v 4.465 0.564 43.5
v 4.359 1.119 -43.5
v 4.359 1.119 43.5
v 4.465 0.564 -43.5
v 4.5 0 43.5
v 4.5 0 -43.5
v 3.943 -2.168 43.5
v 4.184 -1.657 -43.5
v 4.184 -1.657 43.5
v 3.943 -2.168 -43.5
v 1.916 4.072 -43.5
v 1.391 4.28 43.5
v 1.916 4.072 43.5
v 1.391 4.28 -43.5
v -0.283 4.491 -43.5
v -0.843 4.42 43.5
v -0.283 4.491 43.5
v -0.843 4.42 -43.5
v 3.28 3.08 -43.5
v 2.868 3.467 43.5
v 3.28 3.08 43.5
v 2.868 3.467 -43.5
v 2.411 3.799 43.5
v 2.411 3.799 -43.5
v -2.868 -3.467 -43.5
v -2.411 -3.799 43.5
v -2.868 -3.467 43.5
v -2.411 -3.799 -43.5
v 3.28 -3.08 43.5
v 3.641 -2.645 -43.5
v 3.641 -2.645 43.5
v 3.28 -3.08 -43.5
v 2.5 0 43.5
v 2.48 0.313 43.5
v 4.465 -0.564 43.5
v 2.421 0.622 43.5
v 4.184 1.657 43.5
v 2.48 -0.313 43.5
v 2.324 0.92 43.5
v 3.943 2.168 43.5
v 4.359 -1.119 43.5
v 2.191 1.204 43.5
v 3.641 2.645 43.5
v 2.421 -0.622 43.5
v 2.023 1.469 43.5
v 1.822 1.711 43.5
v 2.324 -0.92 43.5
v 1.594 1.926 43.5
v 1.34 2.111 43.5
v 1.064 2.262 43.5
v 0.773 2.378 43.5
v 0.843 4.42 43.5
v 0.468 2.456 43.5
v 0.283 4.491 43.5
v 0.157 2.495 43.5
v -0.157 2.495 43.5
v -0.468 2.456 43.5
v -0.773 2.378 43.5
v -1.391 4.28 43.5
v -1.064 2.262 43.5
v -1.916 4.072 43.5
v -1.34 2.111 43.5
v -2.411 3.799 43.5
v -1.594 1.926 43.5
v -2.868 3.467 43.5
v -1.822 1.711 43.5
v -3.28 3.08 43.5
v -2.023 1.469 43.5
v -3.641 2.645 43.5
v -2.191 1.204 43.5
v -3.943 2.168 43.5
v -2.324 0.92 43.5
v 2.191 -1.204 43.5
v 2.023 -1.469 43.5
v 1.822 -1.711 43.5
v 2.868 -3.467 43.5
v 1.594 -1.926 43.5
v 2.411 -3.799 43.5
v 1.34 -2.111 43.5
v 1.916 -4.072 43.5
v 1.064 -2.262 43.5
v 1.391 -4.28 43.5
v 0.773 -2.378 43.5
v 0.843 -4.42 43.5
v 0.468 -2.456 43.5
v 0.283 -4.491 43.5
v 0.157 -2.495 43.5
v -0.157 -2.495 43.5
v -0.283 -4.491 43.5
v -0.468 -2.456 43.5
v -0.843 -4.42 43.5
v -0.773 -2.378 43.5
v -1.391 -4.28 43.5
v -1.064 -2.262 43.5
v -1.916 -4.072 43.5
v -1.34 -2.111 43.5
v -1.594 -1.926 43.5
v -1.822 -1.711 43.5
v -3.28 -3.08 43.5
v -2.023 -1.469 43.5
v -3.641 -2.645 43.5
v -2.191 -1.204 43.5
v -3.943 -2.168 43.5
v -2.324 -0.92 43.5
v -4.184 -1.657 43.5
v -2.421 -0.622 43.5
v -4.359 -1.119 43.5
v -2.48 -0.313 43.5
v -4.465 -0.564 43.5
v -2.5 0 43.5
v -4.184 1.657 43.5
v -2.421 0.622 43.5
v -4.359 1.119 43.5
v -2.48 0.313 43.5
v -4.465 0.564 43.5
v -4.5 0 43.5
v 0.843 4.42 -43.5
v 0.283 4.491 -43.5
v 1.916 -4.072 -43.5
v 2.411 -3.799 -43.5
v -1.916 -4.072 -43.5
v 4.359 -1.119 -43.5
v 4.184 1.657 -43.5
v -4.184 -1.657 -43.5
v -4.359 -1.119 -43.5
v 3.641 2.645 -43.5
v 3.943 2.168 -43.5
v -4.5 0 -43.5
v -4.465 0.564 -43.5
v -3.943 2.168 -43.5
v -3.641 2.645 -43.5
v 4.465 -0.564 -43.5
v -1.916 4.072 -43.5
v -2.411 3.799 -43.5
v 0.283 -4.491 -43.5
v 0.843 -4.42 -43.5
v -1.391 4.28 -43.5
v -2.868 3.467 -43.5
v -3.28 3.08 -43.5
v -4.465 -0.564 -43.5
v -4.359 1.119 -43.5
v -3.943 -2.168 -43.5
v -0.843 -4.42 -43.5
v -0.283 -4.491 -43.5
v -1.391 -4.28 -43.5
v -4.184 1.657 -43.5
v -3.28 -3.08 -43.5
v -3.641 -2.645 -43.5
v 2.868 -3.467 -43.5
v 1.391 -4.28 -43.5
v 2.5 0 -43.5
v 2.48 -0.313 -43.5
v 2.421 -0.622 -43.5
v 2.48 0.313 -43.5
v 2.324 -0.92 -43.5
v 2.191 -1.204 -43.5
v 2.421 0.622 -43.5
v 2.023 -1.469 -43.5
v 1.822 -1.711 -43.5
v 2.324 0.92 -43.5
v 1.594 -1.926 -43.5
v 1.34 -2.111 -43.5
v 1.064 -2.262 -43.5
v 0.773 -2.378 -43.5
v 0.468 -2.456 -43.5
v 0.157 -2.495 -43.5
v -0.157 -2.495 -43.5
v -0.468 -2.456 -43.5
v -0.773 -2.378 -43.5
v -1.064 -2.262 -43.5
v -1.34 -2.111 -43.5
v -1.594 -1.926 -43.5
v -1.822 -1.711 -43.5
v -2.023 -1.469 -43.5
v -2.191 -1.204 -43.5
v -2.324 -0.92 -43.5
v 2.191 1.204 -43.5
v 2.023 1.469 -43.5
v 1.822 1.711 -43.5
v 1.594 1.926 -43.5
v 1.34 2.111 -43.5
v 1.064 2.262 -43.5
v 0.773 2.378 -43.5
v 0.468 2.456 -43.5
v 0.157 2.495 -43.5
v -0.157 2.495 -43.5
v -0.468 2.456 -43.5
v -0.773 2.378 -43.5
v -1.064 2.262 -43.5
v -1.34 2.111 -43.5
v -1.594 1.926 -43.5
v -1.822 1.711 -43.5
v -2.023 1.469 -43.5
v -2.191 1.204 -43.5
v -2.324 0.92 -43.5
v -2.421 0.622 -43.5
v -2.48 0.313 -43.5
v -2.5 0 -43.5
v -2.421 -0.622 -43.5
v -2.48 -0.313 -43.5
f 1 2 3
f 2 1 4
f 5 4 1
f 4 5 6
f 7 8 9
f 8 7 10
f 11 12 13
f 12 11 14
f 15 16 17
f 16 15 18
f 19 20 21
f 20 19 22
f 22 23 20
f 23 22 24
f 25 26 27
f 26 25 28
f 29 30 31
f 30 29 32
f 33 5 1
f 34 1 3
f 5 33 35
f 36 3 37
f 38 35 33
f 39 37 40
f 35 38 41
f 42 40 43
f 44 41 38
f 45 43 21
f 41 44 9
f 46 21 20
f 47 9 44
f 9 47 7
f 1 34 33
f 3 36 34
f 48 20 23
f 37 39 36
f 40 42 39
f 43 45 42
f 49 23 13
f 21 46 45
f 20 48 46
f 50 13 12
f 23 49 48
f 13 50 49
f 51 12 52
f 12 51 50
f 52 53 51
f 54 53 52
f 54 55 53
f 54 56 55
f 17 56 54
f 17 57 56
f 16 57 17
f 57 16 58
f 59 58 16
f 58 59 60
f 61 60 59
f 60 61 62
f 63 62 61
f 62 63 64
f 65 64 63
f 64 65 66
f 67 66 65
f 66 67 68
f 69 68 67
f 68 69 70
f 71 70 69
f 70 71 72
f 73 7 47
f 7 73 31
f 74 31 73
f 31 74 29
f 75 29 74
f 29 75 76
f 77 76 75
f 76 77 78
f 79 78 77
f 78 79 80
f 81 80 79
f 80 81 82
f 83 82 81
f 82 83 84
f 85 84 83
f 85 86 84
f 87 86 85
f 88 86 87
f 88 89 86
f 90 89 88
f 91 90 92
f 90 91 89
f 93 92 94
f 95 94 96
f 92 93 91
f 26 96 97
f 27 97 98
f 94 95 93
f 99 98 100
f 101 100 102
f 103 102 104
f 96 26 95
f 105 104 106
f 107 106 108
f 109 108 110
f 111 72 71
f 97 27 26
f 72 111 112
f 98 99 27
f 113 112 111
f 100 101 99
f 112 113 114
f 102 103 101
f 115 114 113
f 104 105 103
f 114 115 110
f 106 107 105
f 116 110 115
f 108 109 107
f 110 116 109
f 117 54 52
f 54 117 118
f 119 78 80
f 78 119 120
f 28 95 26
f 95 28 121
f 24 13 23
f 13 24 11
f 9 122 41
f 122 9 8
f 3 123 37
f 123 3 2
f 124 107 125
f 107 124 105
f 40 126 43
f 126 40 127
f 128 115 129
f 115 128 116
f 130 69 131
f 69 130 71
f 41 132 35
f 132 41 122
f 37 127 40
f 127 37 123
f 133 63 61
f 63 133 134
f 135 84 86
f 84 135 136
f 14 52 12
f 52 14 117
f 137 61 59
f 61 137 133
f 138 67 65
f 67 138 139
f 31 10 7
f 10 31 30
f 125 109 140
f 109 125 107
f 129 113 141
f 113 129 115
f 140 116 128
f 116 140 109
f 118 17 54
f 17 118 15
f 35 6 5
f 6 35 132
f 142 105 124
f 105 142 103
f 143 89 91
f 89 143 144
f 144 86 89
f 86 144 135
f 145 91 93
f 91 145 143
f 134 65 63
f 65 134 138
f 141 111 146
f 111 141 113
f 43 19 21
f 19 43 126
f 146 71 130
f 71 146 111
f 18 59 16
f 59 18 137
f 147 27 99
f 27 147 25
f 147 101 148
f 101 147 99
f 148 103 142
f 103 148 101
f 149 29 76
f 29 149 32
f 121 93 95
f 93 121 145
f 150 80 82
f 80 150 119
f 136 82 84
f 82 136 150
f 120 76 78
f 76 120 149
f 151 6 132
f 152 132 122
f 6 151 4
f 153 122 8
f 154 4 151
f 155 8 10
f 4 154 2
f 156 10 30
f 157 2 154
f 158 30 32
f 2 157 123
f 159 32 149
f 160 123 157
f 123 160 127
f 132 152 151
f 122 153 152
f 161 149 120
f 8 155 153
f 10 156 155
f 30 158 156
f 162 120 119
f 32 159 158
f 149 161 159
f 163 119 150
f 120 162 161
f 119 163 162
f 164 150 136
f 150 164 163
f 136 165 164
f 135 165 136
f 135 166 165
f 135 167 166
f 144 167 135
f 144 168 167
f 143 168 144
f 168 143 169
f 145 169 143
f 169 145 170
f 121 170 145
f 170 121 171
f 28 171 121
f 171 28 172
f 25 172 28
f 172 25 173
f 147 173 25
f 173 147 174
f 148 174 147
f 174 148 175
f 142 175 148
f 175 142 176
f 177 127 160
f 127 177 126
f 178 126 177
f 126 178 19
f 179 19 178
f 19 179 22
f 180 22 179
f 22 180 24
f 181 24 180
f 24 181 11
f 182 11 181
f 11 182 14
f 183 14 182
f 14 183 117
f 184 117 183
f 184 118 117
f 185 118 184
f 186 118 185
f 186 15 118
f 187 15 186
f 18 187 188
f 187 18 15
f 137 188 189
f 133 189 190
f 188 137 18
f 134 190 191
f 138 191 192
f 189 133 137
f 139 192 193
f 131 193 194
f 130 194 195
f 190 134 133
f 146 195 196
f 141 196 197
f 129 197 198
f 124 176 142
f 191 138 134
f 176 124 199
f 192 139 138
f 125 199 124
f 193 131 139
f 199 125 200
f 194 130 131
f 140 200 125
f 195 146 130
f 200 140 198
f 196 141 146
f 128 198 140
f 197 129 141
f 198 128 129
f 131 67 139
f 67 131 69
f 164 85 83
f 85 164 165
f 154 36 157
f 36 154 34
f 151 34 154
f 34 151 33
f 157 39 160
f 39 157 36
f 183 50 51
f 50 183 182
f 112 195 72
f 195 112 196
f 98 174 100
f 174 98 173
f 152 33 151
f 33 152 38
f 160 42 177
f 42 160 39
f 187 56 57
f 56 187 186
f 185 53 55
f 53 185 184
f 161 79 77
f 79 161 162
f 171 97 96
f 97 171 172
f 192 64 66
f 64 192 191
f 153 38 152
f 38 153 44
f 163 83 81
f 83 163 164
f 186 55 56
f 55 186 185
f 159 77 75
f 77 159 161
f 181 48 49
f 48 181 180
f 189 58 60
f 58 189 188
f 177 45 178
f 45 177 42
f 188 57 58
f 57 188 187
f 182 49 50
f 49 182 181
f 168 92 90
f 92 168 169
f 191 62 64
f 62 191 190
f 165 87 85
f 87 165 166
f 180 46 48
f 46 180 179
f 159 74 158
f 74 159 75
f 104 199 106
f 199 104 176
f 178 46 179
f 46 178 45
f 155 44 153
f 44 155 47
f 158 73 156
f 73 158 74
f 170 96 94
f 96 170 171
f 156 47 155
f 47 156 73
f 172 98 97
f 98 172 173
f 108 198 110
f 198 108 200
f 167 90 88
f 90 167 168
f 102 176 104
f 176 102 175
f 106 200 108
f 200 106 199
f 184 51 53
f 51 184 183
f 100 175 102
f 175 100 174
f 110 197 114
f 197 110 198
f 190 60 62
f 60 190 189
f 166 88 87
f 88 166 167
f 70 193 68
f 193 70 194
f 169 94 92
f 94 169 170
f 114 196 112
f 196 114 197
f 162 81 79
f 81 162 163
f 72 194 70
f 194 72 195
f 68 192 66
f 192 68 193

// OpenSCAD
$fn = 50;


difference() {
	union() {
		translate(v = [0, 0, -43.5000000000]) {
			cylinder(h = 87, r = 4.5000000000);
		}
	}
	union() {
		translate(v = [0, 0, -100.0000000000]) {
			cylinder(h = 200, r = 2.5000000000);
		}
	}
}
